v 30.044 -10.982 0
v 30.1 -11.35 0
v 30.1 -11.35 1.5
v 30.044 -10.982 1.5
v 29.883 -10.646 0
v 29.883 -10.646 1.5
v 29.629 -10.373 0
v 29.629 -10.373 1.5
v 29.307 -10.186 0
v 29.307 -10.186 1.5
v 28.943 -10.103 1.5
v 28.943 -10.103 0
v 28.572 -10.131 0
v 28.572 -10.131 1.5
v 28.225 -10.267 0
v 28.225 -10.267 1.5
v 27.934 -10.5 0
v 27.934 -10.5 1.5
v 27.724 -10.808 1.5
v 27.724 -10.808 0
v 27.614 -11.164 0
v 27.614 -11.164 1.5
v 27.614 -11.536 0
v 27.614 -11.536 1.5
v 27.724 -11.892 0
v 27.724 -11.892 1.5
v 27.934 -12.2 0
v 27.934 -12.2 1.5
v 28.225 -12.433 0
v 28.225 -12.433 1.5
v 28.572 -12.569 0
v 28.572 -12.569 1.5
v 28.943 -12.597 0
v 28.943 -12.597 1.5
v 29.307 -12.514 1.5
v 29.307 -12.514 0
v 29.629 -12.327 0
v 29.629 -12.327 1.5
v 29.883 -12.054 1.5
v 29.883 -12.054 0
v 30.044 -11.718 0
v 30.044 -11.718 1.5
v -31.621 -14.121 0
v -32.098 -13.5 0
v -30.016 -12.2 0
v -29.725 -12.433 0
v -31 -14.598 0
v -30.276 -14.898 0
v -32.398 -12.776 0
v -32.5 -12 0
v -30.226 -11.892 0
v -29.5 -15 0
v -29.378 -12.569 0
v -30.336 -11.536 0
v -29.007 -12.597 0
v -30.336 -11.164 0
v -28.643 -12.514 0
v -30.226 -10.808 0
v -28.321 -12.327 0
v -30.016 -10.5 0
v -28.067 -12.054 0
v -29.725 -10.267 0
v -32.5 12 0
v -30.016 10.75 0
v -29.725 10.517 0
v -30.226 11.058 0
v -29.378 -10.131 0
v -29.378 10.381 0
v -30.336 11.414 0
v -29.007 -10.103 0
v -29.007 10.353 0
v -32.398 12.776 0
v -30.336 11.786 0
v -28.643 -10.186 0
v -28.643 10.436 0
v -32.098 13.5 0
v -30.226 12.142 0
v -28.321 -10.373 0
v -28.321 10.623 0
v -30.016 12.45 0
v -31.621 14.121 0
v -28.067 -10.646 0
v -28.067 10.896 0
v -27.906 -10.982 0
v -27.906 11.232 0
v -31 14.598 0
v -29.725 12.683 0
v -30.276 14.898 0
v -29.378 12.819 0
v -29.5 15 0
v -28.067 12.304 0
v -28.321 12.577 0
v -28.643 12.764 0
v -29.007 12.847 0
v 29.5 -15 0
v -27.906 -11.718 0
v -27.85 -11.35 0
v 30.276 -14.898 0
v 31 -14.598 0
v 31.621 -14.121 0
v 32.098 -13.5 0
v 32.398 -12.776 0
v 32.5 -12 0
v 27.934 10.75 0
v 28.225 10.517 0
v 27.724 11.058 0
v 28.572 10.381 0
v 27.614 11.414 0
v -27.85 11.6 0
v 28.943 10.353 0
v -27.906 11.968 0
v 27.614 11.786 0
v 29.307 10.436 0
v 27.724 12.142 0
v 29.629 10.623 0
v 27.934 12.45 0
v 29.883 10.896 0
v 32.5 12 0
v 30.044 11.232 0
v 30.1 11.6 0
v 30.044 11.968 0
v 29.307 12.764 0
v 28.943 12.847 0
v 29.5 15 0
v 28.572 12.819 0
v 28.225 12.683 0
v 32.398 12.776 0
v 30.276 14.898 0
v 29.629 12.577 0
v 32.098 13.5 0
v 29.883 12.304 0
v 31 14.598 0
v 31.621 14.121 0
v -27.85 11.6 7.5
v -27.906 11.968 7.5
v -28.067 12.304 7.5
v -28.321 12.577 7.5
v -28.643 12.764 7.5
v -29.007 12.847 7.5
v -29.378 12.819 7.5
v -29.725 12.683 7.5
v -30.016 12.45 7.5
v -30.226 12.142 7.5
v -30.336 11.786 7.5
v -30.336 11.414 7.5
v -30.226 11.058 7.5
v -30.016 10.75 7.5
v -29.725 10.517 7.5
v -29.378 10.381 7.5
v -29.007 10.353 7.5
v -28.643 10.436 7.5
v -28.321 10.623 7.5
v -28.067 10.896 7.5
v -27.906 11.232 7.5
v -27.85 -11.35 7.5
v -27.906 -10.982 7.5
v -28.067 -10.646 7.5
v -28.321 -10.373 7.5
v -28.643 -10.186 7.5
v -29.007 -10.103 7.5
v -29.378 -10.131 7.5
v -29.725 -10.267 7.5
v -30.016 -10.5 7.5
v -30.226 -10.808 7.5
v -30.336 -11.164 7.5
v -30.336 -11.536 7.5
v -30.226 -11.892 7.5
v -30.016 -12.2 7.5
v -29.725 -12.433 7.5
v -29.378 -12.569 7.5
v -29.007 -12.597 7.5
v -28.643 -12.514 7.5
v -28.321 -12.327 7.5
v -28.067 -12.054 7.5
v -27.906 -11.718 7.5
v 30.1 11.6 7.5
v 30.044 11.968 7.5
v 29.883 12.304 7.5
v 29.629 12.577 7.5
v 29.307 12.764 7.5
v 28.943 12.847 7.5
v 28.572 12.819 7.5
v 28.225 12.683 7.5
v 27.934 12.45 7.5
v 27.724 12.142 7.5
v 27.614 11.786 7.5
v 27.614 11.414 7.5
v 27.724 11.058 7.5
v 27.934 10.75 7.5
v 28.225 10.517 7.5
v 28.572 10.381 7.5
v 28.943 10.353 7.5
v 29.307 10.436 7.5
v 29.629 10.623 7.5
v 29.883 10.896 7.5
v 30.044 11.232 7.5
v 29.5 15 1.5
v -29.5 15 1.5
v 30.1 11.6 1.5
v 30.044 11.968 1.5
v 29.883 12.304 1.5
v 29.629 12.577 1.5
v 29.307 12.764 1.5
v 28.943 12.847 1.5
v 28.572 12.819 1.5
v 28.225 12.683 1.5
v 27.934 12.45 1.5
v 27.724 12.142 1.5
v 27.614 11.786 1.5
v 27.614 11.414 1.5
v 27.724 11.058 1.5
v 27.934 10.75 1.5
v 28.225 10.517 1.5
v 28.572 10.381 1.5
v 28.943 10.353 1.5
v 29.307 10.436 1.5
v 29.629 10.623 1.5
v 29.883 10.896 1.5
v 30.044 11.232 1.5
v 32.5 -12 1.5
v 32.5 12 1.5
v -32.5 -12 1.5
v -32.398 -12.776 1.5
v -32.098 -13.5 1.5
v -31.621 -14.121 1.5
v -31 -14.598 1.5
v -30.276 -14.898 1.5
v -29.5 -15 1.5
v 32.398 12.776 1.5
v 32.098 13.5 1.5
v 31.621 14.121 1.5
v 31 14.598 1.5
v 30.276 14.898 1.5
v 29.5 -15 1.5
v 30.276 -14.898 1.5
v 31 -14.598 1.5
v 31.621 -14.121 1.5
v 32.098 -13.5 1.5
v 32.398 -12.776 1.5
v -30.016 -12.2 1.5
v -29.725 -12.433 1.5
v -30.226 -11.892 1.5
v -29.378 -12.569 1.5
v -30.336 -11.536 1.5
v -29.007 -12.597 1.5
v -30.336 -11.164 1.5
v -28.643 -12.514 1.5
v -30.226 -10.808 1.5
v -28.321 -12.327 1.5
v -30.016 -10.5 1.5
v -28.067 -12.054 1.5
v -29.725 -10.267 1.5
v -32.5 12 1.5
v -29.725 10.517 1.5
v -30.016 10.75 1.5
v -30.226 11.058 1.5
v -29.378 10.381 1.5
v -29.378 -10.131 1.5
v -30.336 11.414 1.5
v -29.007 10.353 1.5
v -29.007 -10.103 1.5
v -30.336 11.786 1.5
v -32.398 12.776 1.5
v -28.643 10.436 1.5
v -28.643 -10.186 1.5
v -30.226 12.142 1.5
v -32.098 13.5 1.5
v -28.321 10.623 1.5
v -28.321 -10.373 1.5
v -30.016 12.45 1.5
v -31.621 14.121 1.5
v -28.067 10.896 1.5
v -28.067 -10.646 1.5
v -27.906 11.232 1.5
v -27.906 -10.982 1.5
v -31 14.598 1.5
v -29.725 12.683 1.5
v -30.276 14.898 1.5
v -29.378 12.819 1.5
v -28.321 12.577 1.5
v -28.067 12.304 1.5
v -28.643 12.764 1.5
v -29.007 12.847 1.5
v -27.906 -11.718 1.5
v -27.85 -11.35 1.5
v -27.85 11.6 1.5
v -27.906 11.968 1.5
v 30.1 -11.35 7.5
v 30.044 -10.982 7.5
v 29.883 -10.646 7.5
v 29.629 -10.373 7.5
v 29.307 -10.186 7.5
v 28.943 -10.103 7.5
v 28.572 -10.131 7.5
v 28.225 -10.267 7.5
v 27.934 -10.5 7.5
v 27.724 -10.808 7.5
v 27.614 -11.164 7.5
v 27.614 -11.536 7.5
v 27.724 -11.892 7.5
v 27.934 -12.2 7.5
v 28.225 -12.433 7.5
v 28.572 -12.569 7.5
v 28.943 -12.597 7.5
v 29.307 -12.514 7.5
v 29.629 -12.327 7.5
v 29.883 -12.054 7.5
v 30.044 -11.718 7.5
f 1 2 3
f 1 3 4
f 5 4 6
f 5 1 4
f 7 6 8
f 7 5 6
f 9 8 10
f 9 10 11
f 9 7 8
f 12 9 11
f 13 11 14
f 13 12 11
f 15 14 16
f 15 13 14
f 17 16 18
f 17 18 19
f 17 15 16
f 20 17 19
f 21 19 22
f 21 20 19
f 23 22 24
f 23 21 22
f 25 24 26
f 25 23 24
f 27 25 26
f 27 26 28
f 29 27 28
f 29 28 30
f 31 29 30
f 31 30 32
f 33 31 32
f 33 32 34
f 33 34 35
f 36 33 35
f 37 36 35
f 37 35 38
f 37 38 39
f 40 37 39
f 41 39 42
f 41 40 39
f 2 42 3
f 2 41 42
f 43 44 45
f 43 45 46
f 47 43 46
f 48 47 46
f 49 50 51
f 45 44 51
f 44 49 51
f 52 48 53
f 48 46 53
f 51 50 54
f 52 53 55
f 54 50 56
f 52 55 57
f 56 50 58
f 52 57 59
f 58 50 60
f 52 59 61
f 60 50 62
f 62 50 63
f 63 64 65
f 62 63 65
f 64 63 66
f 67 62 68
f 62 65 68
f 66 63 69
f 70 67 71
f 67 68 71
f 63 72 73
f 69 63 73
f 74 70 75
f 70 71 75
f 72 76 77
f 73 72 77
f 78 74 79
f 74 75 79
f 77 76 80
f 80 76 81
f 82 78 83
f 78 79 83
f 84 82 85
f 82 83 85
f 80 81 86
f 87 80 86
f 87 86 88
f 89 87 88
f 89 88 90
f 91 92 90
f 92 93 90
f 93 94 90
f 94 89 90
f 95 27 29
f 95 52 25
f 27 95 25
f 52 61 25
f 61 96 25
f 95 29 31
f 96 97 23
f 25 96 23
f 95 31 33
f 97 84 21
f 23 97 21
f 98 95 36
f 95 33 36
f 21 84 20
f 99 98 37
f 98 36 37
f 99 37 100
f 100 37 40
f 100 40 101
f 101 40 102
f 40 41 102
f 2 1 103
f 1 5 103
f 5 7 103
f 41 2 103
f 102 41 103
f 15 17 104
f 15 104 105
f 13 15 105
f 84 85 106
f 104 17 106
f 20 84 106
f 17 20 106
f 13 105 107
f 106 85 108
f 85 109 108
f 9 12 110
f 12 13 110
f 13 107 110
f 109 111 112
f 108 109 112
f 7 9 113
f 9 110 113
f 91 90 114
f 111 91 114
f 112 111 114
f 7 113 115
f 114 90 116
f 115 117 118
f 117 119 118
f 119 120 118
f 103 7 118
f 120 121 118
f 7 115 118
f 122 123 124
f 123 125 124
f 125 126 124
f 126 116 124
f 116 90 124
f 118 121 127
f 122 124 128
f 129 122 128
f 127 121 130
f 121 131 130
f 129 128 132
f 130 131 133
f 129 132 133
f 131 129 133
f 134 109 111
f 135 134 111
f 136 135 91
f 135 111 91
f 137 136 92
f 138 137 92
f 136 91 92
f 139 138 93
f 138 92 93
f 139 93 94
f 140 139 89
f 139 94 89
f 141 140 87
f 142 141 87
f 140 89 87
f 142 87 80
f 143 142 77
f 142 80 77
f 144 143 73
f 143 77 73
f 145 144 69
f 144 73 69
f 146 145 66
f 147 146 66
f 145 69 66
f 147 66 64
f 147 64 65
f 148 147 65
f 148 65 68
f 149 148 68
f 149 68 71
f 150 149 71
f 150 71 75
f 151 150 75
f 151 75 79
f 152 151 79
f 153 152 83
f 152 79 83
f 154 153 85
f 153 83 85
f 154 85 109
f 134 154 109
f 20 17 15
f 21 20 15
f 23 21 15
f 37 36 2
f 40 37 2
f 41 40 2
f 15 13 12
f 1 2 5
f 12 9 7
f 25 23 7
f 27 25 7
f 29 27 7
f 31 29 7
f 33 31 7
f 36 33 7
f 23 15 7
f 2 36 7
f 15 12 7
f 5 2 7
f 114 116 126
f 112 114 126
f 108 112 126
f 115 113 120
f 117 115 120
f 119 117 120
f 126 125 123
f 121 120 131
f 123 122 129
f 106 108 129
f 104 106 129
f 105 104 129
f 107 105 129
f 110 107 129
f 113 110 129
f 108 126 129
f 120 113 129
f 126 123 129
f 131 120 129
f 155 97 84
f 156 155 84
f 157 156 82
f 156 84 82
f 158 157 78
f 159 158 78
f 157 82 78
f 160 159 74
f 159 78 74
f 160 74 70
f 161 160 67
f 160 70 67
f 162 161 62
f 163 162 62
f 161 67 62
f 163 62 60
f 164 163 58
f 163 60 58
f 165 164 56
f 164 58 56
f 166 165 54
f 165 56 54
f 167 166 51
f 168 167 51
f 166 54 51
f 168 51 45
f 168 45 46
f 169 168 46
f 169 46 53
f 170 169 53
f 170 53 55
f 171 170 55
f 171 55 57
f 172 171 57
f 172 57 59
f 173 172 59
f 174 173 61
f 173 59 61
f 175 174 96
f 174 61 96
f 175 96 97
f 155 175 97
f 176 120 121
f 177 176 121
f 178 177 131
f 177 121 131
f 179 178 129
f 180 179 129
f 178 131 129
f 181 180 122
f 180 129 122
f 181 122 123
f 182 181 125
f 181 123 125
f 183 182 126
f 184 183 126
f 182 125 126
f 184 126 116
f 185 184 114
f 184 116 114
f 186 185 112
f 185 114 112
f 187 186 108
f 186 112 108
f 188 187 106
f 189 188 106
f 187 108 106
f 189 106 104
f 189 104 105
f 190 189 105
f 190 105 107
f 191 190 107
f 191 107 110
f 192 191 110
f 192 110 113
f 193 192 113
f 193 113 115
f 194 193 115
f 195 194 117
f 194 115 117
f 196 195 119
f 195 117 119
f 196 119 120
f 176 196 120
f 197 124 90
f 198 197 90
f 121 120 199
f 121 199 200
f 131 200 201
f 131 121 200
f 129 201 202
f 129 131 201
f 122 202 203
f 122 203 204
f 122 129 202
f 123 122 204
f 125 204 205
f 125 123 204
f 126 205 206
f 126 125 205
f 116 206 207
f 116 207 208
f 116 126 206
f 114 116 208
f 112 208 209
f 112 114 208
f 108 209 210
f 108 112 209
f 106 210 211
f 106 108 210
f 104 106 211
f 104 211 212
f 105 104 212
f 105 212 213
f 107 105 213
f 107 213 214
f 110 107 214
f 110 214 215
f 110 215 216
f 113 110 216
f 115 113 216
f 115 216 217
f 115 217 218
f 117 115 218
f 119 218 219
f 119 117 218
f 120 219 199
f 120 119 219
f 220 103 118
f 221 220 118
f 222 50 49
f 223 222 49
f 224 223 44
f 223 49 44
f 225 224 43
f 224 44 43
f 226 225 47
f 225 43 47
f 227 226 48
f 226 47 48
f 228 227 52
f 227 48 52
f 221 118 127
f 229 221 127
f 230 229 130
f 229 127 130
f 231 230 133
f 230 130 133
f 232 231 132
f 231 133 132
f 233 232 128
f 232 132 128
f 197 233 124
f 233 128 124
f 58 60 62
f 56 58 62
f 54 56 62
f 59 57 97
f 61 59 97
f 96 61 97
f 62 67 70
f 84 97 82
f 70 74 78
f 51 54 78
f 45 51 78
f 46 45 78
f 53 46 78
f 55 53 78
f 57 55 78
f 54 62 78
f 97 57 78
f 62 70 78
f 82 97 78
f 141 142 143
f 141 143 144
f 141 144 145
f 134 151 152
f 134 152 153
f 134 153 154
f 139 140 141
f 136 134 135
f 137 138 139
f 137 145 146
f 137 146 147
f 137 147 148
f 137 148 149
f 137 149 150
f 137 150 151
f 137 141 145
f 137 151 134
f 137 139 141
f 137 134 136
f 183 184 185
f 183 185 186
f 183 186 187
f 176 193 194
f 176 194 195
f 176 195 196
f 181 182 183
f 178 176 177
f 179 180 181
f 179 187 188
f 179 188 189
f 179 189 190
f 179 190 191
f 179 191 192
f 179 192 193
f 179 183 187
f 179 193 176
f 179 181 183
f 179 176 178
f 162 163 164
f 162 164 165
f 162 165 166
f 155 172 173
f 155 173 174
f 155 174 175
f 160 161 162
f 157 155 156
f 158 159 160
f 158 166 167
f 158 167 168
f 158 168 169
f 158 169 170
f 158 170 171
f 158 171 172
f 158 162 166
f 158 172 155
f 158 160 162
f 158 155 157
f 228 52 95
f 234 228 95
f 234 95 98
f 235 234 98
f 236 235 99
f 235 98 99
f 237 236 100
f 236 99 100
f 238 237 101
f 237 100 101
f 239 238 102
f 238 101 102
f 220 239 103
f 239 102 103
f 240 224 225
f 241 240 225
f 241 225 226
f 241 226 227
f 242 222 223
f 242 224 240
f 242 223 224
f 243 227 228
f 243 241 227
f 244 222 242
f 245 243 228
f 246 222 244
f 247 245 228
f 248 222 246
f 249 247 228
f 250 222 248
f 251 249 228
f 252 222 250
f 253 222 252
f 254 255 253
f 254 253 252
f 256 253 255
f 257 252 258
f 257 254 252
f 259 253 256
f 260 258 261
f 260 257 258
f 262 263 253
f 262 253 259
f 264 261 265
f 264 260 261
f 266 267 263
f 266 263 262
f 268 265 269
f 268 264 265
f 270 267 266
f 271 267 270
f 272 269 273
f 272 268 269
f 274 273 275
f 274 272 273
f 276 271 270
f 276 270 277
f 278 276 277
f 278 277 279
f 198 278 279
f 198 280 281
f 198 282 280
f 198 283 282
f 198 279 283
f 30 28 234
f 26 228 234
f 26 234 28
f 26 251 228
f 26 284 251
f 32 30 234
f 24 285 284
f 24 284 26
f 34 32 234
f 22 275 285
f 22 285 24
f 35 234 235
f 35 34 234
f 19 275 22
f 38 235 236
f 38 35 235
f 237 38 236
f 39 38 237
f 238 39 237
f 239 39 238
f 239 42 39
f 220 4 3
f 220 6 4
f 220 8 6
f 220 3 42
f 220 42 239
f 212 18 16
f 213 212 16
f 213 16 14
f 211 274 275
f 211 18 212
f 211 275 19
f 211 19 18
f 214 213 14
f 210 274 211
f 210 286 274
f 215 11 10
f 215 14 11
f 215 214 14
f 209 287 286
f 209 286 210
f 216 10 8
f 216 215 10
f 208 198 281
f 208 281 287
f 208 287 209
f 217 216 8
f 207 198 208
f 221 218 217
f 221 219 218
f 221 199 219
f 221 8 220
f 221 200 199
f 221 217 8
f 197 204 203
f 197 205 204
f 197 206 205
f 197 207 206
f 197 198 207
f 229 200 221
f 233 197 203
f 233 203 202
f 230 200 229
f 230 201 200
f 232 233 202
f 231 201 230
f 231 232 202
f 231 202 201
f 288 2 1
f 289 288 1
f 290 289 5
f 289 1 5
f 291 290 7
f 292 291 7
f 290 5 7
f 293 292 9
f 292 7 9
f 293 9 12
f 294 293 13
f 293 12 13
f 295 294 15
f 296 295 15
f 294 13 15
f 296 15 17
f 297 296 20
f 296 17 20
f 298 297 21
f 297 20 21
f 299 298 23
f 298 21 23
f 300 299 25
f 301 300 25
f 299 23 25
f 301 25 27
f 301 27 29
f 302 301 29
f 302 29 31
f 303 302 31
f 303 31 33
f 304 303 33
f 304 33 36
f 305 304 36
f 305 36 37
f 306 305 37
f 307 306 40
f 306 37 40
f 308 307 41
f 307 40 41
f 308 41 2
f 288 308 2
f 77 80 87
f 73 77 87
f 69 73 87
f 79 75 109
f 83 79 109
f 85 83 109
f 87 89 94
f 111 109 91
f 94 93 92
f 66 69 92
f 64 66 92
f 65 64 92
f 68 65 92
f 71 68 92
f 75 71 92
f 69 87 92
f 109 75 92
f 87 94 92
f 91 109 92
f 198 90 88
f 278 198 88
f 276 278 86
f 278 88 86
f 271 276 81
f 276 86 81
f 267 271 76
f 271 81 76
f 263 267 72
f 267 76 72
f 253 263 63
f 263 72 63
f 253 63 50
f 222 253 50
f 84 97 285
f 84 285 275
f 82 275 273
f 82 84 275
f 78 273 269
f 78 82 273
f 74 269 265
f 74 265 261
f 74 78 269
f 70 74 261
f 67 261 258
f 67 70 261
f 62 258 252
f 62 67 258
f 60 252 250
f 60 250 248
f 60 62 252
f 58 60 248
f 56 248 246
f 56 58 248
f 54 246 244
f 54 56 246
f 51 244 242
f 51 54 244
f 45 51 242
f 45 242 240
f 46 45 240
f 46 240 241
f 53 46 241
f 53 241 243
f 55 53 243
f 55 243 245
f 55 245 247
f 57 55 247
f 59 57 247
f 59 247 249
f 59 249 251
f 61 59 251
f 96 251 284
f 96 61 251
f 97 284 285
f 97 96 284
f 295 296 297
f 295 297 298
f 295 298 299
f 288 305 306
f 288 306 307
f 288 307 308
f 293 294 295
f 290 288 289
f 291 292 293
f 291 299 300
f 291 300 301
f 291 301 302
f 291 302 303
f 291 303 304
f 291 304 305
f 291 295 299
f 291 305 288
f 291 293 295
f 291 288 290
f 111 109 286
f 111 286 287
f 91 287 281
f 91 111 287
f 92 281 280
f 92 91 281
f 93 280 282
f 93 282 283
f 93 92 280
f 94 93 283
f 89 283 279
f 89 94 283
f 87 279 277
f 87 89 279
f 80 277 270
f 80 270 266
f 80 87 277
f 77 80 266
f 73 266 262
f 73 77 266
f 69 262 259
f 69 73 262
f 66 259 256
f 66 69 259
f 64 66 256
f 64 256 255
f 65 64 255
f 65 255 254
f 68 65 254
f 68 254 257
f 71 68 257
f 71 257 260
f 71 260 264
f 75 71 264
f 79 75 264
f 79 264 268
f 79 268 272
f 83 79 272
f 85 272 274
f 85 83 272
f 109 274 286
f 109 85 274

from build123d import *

# Parameters (mm, degrees)
F0_R     = 1.25
F1_DEPTH = 7.5
F2_DEPTH = 1.5


with BuildPart() as f1:
    # F0 (on Top) → F1 (new body)
    with BuildSketch(Plane.XY):
        with Locations((-29.1, -11.35)):
            Circle(F0_R)
        with Locations((-29.1, 11.6)):
            Circle(F0_R)
        with Locations((28.85, 11.6)):
            Circle(F0_R)
        with Locations((28.85, -11.35)):
            Circle(F0_R)
    extrude(amount=F1_DEPTH)


with BuildPart() as f2:
    # F0 (on Top) → F2 (new body)
    with BuildSketch(Plane.XY):
        with BuildLine():
            Line((-29.5, -15), (29.5, -15))
            ThreePointArc((29.5, -15), (31.62132, -14.12132), (32.5, -12))
            Line((32.5, -12), (32.5, 12))
            ThreePointArc((32.5, 12), (31.62132, 14.12132), (29.5, 15))
            Line((29.5, 15), (-29.5, 15))
            ThreePointArc((-29.5, 15), (-31.62132, 14.12132), (-32.5, 12))
            Line((-32.5, 12), (-32.5, -12))
            ThreePointArc((-32.5, -12), (-31.62132, -14.12132), (-29.5, -15))
        make_face()
        with Locations((-29.1, -11.35)):
            Circle(F0_R, mode=Mode.SUBTRACT)
        with Locations((28.85, -11.35)):
            Circle(F0_R, mode=Mode.SUBTRACT)
        with Locations((-29.1, 11.6)):
            Circle(F0_R, mode=Mode.SUBTRACT)
        with Locations((28.85, 11.6)):
            Circle(F0_R, mode=Mode.SUBTRACT)
    extrude(amount=F2_DEPTH)


solid = Compound([f1.part, f2.part])
